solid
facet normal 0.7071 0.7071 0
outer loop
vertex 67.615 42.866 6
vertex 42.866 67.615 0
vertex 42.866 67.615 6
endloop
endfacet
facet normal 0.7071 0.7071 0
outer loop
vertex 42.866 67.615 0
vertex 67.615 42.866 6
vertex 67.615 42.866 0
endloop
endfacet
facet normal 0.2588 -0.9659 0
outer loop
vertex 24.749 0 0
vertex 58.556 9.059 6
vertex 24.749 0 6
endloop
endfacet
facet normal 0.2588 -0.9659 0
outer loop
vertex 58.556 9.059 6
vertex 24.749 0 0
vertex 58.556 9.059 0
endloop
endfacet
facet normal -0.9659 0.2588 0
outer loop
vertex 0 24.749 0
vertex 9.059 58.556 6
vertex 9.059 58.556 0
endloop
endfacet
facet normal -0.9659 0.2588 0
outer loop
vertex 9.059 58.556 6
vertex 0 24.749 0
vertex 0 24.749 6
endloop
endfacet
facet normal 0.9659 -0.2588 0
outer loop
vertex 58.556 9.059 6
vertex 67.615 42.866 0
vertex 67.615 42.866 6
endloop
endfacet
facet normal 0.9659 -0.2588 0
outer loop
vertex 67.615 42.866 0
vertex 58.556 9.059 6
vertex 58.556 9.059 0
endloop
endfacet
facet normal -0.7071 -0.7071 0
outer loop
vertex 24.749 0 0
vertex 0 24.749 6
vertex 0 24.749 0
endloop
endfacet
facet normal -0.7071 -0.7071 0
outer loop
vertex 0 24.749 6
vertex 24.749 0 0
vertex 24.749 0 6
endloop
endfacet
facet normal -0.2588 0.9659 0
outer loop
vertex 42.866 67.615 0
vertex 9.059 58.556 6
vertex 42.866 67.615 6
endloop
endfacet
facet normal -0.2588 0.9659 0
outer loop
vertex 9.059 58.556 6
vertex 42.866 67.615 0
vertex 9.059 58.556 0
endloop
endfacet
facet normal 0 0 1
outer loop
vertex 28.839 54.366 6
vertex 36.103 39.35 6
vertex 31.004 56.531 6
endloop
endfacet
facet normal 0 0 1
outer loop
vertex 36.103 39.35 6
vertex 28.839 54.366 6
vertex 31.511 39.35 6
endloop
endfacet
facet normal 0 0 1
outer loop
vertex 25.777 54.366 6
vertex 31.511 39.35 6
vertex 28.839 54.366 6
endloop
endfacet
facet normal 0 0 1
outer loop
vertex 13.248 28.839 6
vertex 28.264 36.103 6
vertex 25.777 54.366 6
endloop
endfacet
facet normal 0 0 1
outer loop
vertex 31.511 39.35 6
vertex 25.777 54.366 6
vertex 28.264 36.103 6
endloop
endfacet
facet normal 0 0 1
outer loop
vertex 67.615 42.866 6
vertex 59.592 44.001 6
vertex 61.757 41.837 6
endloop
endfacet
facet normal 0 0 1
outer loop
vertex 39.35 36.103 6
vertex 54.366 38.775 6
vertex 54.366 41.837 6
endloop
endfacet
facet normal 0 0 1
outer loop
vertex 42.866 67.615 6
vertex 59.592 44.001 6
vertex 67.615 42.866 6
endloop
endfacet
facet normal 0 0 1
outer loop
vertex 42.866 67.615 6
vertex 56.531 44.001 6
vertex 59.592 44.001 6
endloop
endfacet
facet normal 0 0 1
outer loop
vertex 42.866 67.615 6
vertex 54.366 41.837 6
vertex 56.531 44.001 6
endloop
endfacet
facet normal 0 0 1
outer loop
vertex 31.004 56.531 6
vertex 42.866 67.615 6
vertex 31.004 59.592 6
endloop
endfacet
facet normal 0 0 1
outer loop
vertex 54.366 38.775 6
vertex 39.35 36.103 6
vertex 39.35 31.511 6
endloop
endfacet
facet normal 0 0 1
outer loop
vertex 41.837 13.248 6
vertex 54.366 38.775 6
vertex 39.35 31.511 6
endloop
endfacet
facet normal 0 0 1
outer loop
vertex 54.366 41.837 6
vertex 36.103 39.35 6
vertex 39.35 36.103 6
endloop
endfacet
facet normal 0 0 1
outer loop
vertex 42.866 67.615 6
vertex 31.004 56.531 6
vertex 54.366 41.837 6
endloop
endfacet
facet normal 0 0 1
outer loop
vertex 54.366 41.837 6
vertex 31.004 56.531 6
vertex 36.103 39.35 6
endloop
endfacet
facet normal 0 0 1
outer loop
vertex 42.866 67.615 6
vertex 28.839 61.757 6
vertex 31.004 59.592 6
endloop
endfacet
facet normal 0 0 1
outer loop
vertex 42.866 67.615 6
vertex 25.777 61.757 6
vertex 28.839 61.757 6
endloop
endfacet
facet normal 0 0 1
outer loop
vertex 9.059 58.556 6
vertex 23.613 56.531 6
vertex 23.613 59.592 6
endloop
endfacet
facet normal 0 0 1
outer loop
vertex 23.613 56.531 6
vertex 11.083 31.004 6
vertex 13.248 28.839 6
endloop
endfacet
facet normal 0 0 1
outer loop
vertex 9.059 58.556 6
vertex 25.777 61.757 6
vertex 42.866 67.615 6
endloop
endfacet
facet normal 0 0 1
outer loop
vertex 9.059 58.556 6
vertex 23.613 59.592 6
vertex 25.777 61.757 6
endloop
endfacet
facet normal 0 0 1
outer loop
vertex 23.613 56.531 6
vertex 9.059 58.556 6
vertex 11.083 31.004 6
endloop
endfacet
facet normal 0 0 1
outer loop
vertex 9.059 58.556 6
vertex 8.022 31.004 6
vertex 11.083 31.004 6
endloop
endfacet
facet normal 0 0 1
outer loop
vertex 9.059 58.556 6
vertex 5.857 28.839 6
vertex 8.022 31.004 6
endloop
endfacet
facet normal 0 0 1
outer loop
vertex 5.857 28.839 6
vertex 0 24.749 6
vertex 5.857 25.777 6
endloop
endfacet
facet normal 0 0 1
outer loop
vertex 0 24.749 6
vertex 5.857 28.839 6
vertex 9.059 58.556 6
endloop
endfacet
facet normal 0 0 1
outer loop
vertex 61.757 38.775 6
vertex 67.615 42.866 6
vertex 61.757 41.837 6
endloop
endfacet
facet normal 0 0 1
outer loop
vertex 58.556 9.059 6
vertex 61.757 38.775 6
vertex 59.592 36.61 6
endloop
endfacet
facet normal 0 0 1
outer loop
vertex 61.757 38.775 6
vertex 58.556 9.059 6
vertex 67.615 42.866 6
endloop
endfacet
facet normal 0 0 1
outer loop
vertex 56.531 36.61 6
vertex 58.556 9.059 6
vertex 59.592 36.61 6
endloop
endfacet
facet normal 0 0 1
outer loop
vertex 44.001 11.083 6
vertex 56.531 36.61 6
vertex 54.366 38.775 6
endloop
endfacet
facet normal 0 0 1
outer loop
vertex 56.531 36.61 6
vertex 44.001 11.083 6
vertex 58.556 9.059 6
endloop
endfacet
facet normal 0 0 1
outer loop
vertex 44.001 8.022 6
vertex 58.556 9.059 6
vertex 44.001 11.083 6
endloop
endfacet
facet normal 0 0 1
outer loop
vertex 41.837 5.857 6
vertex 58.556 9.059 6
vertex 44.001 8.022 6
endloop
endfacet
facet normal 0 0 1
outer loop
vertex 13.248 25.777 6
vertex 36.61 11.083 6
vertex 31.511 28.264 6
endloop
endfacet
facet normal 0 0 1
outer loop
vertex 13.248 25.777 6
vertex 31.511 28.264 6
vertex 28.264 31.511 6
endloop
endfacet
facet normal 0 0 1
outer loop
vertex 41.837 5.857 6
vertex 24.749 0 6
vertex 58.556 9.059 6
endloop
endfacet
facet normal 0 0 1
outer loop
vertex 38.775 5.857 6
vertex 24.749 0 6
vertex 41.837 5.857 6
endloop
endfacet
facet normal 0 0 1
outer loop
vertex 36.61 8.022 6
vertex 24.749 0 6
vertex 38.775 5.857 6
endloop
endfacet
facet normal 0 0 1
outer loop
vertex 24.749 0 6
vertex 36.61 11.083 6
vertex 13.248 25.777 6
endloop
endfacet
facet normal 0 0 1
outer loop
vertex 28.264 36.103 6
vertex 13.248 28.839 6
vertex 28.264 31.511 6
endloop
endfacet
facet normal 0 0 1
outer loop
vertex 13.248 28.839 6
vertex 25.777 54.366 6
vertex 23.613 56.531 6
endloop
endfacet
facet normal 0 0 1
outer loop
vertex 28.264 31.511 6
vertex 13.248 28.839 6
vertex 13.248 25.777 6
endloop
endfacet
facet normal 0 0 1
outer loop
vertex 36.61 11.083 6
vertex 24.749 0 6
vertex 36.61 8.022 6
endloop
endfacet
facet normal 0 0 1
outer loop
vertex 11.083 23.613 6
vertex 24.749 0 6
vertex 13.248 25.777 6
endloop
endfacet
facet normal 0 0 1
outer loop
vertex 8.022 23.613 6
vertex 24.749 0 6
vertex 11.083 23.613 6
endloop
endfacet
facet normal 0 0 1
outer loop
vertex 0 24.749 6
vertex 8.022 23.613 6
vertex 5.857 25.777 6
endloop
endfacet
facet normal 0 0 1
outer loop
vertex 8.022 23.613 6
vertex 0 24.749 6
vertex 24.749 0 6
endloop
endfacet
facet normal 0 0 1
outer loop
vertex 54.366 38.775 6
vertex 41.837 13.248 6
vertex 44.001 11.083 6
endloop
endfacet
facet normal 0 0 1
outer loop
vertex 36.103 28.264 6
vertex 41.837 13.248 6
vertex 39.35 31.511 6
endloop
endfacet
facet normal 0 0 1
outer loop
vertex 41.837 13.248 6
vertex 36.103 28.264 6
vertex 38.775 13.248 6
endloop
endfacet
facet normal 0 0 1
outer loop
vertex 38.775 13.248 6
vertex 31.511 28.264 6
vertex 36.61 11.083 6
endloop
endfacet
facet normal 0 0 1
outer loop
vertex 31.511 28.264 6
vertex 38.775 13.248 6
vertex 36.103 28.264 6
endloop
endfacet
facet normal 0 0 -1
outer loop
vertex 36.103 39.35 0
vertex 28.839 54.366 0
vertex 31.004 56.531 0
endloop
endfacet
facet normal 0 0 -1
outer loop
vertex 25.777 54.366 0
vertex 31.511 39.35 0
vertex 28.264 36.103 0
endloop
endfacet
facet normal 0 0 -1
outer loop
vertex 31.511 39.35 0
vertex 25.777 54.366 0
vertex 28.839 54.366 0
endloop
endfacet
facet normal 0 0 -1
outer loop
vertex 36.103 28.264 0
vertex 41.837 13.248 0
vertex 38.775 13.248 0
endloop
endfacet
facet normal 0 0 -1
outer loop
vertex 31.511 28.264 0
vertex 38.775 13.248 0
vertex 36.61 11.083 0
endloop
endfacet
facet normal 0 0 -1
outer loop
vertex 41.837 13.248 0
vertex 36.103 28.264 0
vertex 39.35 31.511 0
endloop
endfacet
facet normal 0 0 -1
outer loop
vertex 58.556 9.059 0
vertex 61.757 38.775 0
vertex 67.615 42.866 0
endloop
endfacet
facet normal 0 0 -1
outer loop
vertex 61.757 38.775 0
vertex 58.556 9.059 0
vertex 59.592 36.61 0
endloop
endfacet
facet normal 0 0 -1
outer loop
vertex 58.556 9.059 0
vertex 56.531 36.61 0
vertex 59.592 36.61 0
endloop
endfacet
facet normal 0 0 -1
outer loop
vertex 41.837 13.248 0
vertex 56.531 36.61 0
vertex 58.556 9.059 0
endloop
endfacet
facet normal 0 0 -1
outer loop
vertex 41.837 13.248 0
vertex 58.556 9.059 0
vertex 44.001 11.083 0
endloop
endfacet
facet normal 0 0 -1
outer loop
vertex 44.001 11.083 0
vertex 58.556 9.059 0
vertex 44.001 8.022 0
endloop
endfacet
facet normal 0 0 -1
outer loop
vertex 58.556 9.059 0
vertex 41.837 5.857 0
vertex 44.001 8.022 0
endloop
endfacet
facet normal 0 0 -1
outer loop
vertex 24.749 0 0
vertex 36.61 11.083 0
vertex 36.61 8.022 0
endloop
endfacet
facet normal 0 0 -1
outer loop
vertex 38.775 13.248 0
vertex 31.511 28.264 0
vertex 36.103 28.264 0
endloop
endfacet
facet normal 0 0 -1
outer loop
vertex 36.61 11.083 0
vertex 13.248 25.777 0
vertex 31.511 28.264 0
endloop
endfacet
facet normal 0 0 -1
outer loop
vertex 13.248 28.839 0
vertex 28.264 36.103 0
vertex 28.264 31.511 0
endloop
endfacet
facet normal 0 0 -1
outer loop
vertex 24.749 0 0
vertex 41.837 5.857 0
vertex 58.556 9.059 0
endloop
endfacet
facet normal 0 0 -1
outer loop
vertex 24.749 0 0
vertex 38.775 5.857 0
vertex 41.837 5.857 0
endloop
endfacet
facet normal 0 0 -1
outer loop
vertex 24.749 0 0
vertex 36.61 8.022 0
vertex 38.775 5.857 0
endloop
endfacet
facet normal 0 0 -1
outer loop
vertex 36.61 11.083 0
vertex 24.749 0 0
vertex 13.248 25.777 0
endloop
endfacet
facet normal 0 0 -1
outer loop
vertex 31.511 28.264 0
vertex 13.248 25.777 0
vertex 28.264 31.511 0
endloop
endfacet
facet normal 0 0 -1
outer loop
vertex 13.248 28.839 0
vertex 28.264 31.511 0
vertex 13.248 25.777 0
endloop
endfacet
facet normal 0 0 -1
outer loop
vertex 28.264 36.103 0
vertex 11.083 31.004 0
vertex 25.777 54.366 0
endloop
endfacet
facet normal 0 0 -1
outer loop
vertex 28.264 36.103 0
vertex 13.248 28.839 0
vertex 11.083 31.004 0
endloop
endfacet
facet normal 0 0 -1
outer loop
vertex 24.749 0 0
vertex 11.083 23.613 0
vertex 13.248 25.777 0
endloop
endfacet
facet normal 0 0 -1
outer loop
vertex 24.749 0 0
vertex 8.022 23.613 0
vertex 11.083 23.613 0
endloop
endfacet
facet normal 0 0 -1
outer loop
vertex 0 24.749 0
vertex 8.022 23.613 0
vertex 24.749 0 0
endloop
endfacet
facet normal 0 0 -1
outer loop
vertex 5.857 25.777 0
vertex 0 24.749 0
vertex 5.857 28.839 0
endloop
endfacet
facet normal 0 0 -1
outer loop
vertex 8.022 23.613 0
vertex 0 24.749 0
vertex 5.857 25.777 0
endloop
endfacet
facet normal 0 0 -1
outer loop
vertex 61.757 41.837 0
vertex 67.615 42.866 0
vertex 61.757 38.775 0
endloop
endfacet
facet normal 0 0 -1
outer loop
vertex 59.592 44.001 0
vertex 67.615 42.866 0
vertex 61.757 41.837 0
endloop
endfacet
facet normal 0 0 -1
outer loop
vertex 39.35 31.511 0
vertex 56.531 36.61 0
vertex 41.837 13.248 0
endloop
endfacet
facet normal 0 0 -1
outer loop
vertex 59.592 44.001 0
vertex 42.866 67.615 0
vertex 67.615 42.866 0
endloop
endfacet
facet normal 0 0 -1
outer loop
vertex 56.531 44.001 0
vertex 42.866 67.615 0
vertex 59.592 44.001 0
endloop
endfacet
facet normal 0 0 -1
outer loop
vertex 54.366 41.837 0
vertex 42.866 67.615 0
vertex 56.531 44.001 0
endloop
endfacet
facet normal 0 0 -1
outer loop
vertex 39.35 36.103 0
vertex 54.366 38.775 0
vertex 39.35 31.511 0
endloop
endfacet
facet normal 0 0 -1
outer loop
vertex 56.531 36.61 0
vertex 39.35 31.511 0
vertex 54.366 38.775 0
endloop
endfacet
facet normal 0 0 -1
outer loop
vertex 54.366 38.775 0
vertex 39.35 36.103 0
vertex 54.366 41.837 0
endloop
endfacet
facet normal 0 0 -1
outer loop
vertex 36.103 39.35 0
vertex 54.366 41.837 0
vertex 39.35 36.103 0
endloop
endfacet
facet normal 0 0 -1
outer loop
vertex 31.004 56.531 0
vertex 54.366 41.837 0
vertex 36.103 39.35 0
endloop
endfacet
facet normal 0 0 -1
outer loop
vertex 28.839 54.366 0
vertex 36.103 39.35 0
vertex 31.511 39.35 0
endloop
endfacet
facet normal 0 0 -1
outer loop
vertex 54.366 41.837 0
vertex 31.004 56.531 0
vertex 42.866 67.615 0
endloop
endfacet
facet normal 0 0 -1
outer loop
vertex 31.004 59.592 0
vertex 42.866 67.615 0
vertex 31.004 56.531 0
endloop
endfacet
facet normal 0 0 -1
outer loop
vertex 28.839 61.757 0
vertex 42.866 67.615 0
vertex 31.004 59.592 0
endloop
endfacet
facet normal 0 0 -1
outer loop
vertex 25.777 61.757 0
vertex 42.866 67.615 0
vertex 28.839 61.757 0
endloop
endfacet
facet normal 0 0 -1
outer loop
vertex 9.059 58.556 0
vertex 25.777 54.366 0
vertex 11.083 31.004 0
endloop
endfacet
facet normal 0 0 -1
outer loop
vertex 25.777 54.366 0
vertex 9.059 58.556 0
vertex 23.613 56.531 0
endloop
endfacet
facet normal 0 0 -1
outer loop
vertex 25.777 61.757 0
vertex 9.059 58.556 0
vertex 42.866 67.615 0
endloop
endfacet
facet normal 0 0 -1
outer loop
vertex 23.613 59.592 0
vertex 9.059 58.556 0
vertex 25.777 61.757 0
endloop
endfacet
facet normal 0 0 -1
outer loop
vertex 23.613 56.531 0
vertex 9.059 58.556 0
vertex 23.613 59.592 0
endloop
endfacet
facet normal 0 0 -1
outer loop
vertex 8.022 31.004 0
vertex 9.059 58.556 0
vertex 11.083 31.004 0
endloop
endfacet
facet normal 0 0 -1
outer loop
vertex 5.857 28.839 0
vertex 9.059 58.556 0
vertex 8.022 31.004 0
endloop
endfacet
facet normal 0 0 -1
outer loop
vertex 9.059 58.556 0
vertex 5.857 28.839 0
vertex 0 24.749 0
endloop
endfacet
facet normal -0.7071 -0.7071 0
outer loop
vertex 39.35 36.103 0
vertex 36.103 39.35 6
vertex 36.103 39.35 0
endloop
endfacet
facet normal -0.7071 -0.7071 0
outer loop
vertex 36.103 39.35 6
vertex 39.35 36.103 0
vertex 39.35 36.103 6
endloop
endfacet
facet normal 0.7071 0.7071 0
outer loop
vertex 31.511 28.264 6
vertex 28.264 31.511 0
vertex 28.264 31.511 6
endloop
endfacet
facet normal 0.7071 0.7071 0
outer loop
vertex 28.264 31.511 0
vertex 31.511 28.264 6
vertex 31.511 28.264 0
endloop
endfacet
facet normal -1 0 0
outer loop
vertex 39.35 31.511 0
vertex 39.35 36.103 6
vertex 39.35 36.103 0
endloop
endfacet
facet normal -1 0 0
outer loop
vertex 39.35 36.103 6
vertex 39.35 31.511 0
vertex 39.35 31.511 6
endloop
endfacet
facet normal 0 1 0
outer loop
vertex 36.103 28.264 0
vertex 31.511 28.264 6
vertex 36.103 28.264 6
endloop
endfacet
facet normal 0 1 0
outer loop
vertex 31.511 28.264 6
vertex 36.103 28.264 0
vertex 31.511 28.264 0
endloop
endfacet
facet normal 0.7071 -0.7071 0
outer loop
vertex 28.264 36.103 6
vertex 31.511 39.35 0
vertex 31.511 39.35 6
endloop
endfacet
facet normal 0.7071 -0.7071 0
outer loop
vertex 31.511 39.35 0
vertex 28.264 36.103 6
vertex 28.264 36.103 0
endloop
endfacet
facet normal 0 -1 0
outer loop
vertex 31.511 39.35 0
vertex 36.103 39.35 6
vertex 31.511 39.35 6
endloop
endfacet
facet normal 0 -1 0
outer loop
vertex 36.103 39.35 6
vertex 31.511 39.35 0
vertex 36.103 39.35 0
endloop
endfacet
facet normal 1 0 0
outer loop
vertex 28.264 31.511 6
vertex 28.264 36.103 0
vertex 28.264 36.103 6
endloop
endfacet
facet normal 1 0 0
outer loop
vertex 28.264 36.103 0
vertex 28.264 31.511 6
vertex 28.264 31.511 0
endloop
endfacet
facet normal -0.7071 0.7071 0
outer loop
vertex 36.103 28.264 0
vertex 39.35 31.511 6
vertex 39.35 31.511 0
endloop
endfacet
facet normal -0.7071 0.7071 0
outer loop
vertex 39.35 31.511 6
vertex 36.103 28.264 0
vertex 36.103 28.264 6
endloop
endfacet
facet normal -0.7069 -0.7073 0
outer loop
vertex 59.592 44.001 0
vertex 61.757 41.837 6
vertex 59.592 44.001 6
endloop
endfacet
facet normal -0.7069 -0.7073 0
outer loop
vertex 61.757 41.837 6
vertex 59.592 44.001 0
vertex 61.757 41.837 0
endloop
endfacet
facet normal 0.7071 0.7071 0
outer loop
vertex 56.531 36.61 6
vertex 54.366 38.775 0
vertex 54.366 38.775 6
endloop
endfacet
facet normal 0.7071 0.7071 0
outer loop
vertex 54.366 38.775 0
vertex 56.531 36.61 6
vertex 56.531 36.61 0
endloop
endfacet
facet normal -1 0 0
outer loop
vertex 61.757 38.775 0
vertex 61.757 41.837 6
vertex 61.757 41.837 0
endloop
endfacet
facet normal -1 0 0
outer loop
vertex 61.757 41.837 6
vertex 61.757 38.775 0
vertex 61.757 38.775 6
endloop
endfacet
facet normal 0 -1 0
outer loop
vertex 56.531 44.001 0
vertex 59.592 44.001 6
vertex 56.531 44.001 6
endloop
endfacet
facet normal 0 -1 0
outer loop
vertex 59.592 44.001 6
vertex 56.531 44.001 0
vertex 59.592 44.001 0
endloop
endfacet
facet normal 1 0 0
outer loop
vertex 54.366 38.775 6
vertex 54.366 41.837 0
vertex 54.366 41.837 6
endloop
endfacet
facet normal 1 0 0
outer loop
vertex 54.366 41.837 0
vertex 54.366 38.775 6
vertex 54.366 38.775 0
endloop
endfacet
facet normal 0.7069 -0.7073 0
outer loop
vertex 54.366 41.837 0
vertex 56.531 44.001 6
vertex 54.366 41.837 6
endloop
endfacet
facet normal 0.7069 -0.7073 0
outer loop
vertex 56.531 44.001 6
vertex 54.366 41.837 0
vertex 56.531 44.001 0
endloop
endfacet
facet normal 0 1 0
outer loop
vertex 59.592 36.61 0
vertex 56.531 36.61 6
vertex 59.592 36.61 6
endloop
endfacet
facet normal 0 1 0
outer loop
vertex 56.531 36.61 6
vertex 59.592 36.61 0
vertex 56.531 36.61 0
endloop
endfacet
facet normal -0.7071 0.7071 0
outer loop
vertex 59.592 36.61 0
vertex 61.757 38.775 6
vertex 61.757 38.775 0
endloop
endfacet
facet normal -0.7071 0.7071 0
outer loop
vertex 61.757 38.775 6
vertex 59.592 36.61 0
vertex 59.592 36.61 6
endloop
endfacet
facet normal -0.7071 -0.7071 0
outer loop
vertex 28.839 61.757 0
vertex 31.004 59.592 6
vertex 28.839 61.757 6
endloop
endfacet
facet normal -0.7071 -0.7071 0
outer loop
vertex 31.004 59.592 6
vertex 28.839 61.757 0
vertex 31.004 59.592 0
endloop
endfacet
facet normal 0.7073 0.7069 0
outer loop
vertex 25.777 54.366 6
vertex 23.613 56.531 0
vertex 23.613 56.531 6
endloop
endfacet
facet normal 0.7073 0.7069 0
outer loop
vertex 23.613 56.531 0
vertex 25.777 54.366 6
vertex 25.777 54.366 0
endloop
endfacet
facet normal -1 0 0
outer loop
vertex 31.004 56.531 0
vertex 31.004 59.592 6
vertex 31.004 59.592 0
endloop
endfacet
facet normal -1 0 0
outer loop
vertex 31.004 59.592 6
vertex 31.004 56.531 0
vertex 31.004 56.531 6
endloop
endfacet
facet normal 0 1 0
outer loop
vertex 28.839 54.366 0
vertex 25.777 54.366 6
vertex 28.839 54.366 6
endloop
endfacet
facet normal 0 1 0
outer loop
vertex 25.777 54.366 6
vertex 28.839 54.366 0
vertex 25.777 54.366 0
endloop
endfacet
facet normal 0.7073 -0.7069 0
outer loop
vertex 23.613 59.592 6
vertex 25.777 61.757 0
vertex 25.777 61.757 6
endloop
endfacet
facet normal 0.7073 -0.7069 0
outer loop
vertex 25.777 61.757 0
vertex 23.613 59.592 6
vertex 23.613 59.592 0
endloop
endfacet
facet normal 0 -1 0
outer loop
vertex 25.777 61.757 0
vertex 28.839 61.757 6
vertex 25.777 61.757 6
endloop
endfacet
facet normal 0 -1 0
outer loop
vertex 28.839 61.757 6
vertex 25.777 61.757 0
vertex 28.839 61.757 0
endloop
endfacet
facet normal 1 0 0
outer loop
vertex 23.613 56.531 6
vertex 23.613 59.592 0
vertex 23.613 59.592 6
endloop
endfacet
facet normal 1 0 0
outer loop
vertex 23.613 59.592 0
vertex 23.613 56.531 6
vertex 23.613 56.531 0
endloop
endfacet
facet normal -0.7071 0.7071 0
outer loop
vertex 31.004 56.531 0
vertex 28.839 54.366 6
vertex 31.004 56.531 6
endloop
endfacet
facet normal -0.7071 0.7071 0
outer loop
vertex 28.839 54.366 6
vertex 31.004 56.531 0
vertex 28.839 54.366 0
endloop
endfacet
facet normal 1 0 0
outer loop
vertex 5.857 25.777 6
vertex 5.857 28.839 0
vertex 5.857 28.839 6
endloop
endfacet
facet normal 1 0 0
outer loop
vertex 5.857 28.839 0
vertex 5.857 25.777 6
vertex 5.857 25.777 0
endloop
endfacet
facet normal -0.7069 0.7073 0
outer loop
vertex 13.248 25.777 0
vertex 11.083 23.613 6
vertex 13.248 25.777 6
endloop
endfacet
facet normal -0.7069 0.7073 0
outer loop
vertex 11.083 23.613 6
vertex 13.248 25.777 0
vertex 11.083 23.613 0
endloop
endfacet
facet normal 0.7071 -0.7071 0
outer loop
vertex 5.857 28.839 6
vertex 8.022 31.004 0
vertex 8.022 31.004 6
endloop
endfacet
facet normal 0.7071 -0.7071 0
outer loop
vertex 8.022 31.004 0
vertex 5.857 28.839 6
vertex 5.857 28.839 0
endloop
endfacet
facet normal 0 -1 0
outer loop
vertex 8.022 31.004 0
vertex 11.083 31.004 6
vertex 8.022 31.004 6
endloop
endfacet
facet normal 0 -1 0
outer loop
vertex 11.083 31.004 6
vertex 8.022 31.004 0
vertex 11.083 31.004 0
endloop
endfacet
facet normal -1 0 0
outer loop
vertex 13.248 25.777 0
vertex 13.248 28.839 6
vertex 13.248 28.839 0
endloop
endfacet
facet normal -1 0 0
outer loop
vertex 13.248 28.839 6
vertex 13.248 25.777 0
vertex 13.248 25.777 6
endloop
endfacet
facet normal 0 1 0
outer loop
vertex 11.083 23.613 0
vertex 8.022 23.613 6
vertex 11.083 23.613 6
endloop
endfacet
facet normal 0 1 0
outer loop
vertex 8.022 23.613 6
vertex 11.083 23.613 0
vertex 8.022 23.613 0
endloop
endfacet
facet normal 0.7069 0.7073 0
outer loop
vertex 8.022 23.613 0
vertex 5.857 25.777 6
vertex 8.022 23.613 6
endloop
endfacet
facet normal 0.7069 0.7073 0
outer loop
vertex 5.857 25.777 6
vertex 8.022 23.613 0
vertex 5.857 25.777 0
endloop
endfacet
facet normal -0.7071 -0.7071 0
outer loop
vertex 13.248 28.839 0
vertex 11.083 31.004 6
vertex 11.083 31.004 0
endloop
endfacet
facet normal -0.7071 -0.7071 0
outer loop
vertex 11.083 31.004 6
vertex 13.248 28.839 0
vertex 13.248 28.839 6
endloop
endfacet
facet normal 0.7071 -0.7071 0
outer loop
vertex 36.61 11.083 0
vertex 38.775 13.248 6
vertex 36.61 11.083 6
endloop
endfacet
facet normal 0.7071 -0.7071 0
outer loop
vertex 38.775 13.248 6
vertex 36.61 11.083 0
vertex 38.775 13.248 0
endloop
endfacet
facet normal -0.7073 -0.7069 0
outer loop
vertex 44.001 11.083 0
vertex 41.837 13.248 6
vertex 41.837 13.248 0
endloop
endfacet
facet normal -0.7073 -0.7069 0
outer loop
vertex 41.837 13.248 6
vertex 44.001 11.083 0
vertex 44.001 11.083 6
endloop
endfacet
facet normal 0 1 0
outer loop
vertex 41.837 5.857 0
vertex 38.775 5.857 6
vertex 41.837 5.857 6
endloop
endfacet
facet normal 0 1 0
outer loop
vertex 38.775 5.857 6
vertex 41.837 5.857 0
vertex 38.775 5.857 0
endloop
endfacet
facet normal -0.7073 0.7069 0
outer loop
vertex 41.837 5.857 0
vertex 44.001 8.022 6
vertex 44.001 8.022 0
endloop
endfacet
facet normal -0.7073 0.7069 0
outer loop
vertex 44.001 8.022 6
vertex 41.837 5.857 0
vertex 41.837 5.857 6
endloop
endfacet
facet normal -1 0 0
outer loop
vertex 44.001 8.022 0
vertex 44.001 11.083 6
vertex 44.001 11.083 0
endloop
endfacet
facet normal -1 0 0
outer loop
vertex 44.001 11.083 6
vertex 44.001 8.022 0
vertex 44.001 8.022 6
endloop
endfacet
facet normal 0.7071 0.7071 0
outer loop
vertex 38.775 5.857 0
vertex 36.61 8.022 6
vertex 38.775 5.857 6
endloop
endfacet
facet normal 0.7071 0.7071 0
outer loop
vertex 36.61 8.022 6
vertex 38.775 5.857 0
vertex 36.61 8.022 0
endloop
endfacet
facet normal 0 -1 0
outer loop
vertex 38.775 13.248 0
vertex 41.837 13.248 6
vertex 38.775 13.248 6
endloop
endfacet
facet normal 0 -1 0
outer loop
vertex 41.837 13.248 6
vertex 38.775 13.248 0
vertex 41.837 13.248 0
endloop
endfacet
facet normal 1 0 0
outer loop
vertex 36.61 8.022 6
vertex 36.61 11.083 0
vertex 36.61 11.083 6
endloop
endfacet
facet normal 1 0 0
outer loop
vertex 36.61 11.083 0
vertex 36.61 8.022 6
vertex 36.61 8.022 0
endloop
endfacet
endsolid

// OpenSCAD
$fn = 32;

// ----------------------------------------------------------------------
// Polygon plate: 6-gon R35, 4 bolt windows
// ----------------------------------------------------------------------

// --- parameters (mm) ---
sides = 6;                // number of polygon sides
plate_r = 35;             // circumscribed radius of the polygon
bore_r = 6;               // centre bore radius
bolts = 4;                // number of bolt windows
ring_r = 25.11;           // bolt-circle radius
bolt_r = 4;               // bolt window radius
plate_t = 6;              // plate thickness, Z (extrusion height)

plate_d = 2 * plate_r;  // circumscribed diameter
bore_d = 2 * bore_r;  // centre bore diameter
bolt_d = 2 * bolt_r;  // bolt window diameter
ring_d = 2 * ring_r;  // bolt-circle diameter

profile = [[67.615, 42.866], [42.866, 67.615], [9.059, 58.556], [0, 24.749], [24.749, 0], [58.556, 9.059]];  // primary outline, 6 points, counter clockwise
void_1 = [[39.35, 36.103], [36.103, 39.35], [31.511, 39.35], [28.264, 36.103], [28.264, 31.511], [31.511, 28.264], [36.103, 28.264], [39.35, 31.511]];  // centre bore, 8 points
void_2 = [[61.757, 41.837], [59.592, 44.001], [56.531, 44.001], [54.366, 41.837], [54.366, 38.775], [56.531, 36.61], [59.592, 36.61], [61.757, 38.775]];  // bolt window 1, 8 points
void_3 = [[31.004, 59.592], [28.839, 61.757], [25.777, 61.757], [23.613, 59.592], [23.613, 56.531], [25.777, 54.366], [28.839, 54.366], [31.004, 56.531]];  // bolt window 2, 8 points
void_4 = [[13.248, 28.839], [11.083, 31.004], [8.022, 31.004], [5.857, 28.839], [5.857, 25.777], [8.022, 23.613], [11.083, 23.613], [13.248, 25.777]];  // bolt window 3, 8 points
void_5 = [[44.001, 11.083], [41.837, 13.248], [38.775, 13.248], [36.61, 11.083], [36.61, 8.022], [38.775, 5.857], [41.837, 5.857], [44.001, 8.022]];  // bolt window 4, 8 points

// --- the one profile operation ---
difference() {
  linear_extrude(height = plate_t) polygon(points = profile);
  translate([0, 0, -1])
    linear_extrude(height = plate_t + 2) polygon(points = void_1);
  translate([0, 0, -1])
    linear_extrude(height = plate_t + 2) polygon(points = void_2);
  translate([0, 0, -1])
    linear_extrude(height = plate_t + 2) polygon(points = void_3);
  translate([0, 0, -1])
    linear_extrude(height = plate_t + 2) polygon(points = void_4);
  translate([0, 0, -1])
    linear_extrude(height = plate_t + 2) polygon(points = void_5);
}
